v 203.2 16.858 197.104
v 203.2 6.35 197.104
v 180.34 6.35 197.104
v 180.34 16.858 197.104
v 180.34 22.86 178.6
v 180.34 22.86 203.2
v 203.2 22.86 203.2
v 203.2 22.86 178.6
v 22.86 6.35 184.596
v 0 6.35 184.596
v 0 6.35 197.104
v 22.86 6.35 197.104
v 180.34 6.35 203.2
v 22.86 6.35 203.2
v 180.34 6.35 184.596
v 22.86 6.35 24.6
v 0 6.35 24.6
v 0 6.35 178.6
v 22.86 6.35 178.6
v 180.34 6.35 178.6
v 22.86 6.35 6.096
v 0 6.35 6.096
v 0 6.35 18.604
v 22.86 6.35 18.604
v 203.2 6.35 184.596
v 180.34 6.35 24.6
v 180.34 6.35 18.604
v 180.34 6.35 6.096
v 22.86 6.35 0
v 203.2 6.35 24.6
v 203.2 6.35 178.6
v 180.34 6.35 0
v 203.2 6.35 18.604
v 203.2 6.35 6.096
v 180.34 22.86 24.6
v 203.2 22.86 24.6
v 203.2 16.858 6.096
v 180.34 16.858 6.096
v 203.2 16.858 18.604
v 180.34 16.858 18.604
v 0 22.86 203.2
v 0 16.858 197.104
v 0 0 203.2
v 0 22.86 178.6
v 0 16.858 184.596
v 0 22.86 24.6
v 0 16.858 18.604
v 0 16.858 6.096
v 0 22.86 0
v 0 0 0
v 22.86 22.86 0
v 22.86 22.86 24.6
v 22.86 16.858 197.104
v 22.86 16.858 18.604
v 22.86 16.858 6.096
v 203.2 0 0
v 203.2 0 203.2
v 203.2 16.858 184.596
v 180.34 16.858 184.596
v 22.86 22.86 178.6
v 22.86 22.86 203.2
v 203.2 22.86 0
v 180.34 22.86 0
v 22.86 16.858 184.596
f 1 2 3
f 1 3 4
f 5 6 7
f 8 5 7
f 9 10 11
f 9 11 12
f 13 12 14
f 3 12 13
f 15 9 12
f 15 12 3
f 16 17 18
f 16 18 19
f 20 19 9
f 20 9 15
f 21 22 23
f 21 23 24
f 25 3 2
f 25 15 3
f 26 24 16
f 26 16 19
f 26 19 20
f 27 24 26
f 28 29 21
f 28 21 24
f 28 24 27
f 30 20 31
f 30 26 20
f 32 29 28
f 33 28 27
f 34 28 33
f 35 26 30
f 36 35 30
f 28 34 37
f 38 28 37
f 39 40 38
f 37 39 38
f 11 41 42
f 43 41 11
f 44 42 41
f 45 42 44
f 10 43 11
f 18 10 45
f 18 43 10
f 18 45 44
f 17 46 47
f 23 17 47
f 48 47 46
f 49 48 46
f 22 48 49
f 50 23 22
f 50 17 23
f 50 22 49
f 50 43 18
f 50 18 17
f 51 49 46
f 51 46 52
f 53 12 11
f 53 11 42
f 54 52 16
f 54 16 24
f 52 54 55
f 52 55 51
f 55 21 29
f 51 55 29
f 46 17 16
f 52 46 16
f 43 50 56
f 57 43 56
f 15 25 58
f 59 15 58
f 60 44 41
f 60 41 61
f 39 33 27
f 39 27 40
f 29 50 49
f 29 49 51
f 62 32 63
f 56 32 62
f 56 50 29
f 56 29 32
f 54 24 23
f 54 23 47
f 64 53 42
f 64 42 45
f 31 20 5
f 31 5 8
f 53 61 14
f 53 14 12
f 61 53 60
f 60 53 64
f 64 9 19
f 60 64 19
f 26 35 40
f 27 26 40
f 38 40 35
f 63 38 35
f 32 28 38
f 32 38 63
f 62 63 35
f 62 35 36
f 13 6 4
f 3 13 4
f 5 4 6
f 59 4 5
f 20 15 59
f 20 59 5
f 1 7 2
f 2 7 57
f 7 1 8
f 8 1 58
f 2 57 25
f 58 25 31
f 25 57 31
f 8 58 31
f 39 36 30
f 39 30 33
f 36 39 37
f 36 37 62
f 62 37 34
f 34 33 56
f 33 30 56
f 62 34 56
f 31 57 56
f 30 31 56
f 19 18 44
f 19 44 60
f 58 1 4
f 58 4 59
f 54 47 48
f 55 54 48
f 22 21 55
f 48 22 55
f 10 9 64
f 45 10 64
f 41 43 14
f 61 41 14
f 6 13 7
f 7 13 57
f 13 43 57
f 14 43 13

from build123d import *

# Parameters (mm, degrees)
SKETCH2_W           = 203.2
SKETCH2_H           = 203.2
BOSS_EXTRUDE1_DEPTH = 6.35
SKETCH3_W           = 22.86
SKETCH3_H           = 24.6
BOSS_EXTRUDE2_DEPTH = 16.51
CUT_EXTRUDE1_START  = -203.2
SKETCH4_W           = 12.508
SKETCH4_H           = 10.508
CUT_EXTRUDE1_DEPTH  = 203.2


with BuildPart() as part:
    # Sketch2 → Boss-Extrude1 (new body)
    with BuildSketch(Plane(origin=(0, 0, 0), x_dir=(1, 0, 0), z_dir=(0, 1, 0))):
        with Locations((101.6, -101.6)):
            Rectangle(SKETCH2_W, SKETCH2_H)
    extrude(amount=BOSS_EXTRUDE1_DEPTH)

    # Sketch3 → Boss-Extrude2 (add)
    with BuildSketch(Plane(origin=(0, 6.35, 0), x_dir=(1, 0, 0), z_dir=(0, 1, 0))):
        with Locations((191.77, -190.9)):
            Rectangle(SKETCH3_W, SKETCH3_H)
        with Locations((11.43, -190.9)):
            Rectangle(SKETCH3_W, SKETCH3_H)
        with Locations((11.43, -12.3)):
            Rectangle(SKETCH3_W, SKETCH3_H)
        with Locations((191.77, -12.3)):
            Rectangle(SKETCH3_W, SKETCH3_H)
    extrude(amount=BOSS_EXTRUDE2_DEPTH)

    # Sketch4 → Cut-Extrude1 (cut)
    with BuildSketch(Plane(origin=(203.2, 0, 0), x_dir=(0, 0, -1), z_dir=(1, 0, 0)).offset(CUT_EXTRUDE1_START)):
        with Locations((-190.85, 11.604)):
            Rectangle(SKETCH4_W, SKETCH4_H)
        with Locations((-12.35, 11.604)):
            Rectangle(SKETCH4_W, SKETCH4_H)
    extrude(amount=CUT_EXTRUDE1_DEPTH, mode=Mode.SUBTRACT)


solid = part.part
